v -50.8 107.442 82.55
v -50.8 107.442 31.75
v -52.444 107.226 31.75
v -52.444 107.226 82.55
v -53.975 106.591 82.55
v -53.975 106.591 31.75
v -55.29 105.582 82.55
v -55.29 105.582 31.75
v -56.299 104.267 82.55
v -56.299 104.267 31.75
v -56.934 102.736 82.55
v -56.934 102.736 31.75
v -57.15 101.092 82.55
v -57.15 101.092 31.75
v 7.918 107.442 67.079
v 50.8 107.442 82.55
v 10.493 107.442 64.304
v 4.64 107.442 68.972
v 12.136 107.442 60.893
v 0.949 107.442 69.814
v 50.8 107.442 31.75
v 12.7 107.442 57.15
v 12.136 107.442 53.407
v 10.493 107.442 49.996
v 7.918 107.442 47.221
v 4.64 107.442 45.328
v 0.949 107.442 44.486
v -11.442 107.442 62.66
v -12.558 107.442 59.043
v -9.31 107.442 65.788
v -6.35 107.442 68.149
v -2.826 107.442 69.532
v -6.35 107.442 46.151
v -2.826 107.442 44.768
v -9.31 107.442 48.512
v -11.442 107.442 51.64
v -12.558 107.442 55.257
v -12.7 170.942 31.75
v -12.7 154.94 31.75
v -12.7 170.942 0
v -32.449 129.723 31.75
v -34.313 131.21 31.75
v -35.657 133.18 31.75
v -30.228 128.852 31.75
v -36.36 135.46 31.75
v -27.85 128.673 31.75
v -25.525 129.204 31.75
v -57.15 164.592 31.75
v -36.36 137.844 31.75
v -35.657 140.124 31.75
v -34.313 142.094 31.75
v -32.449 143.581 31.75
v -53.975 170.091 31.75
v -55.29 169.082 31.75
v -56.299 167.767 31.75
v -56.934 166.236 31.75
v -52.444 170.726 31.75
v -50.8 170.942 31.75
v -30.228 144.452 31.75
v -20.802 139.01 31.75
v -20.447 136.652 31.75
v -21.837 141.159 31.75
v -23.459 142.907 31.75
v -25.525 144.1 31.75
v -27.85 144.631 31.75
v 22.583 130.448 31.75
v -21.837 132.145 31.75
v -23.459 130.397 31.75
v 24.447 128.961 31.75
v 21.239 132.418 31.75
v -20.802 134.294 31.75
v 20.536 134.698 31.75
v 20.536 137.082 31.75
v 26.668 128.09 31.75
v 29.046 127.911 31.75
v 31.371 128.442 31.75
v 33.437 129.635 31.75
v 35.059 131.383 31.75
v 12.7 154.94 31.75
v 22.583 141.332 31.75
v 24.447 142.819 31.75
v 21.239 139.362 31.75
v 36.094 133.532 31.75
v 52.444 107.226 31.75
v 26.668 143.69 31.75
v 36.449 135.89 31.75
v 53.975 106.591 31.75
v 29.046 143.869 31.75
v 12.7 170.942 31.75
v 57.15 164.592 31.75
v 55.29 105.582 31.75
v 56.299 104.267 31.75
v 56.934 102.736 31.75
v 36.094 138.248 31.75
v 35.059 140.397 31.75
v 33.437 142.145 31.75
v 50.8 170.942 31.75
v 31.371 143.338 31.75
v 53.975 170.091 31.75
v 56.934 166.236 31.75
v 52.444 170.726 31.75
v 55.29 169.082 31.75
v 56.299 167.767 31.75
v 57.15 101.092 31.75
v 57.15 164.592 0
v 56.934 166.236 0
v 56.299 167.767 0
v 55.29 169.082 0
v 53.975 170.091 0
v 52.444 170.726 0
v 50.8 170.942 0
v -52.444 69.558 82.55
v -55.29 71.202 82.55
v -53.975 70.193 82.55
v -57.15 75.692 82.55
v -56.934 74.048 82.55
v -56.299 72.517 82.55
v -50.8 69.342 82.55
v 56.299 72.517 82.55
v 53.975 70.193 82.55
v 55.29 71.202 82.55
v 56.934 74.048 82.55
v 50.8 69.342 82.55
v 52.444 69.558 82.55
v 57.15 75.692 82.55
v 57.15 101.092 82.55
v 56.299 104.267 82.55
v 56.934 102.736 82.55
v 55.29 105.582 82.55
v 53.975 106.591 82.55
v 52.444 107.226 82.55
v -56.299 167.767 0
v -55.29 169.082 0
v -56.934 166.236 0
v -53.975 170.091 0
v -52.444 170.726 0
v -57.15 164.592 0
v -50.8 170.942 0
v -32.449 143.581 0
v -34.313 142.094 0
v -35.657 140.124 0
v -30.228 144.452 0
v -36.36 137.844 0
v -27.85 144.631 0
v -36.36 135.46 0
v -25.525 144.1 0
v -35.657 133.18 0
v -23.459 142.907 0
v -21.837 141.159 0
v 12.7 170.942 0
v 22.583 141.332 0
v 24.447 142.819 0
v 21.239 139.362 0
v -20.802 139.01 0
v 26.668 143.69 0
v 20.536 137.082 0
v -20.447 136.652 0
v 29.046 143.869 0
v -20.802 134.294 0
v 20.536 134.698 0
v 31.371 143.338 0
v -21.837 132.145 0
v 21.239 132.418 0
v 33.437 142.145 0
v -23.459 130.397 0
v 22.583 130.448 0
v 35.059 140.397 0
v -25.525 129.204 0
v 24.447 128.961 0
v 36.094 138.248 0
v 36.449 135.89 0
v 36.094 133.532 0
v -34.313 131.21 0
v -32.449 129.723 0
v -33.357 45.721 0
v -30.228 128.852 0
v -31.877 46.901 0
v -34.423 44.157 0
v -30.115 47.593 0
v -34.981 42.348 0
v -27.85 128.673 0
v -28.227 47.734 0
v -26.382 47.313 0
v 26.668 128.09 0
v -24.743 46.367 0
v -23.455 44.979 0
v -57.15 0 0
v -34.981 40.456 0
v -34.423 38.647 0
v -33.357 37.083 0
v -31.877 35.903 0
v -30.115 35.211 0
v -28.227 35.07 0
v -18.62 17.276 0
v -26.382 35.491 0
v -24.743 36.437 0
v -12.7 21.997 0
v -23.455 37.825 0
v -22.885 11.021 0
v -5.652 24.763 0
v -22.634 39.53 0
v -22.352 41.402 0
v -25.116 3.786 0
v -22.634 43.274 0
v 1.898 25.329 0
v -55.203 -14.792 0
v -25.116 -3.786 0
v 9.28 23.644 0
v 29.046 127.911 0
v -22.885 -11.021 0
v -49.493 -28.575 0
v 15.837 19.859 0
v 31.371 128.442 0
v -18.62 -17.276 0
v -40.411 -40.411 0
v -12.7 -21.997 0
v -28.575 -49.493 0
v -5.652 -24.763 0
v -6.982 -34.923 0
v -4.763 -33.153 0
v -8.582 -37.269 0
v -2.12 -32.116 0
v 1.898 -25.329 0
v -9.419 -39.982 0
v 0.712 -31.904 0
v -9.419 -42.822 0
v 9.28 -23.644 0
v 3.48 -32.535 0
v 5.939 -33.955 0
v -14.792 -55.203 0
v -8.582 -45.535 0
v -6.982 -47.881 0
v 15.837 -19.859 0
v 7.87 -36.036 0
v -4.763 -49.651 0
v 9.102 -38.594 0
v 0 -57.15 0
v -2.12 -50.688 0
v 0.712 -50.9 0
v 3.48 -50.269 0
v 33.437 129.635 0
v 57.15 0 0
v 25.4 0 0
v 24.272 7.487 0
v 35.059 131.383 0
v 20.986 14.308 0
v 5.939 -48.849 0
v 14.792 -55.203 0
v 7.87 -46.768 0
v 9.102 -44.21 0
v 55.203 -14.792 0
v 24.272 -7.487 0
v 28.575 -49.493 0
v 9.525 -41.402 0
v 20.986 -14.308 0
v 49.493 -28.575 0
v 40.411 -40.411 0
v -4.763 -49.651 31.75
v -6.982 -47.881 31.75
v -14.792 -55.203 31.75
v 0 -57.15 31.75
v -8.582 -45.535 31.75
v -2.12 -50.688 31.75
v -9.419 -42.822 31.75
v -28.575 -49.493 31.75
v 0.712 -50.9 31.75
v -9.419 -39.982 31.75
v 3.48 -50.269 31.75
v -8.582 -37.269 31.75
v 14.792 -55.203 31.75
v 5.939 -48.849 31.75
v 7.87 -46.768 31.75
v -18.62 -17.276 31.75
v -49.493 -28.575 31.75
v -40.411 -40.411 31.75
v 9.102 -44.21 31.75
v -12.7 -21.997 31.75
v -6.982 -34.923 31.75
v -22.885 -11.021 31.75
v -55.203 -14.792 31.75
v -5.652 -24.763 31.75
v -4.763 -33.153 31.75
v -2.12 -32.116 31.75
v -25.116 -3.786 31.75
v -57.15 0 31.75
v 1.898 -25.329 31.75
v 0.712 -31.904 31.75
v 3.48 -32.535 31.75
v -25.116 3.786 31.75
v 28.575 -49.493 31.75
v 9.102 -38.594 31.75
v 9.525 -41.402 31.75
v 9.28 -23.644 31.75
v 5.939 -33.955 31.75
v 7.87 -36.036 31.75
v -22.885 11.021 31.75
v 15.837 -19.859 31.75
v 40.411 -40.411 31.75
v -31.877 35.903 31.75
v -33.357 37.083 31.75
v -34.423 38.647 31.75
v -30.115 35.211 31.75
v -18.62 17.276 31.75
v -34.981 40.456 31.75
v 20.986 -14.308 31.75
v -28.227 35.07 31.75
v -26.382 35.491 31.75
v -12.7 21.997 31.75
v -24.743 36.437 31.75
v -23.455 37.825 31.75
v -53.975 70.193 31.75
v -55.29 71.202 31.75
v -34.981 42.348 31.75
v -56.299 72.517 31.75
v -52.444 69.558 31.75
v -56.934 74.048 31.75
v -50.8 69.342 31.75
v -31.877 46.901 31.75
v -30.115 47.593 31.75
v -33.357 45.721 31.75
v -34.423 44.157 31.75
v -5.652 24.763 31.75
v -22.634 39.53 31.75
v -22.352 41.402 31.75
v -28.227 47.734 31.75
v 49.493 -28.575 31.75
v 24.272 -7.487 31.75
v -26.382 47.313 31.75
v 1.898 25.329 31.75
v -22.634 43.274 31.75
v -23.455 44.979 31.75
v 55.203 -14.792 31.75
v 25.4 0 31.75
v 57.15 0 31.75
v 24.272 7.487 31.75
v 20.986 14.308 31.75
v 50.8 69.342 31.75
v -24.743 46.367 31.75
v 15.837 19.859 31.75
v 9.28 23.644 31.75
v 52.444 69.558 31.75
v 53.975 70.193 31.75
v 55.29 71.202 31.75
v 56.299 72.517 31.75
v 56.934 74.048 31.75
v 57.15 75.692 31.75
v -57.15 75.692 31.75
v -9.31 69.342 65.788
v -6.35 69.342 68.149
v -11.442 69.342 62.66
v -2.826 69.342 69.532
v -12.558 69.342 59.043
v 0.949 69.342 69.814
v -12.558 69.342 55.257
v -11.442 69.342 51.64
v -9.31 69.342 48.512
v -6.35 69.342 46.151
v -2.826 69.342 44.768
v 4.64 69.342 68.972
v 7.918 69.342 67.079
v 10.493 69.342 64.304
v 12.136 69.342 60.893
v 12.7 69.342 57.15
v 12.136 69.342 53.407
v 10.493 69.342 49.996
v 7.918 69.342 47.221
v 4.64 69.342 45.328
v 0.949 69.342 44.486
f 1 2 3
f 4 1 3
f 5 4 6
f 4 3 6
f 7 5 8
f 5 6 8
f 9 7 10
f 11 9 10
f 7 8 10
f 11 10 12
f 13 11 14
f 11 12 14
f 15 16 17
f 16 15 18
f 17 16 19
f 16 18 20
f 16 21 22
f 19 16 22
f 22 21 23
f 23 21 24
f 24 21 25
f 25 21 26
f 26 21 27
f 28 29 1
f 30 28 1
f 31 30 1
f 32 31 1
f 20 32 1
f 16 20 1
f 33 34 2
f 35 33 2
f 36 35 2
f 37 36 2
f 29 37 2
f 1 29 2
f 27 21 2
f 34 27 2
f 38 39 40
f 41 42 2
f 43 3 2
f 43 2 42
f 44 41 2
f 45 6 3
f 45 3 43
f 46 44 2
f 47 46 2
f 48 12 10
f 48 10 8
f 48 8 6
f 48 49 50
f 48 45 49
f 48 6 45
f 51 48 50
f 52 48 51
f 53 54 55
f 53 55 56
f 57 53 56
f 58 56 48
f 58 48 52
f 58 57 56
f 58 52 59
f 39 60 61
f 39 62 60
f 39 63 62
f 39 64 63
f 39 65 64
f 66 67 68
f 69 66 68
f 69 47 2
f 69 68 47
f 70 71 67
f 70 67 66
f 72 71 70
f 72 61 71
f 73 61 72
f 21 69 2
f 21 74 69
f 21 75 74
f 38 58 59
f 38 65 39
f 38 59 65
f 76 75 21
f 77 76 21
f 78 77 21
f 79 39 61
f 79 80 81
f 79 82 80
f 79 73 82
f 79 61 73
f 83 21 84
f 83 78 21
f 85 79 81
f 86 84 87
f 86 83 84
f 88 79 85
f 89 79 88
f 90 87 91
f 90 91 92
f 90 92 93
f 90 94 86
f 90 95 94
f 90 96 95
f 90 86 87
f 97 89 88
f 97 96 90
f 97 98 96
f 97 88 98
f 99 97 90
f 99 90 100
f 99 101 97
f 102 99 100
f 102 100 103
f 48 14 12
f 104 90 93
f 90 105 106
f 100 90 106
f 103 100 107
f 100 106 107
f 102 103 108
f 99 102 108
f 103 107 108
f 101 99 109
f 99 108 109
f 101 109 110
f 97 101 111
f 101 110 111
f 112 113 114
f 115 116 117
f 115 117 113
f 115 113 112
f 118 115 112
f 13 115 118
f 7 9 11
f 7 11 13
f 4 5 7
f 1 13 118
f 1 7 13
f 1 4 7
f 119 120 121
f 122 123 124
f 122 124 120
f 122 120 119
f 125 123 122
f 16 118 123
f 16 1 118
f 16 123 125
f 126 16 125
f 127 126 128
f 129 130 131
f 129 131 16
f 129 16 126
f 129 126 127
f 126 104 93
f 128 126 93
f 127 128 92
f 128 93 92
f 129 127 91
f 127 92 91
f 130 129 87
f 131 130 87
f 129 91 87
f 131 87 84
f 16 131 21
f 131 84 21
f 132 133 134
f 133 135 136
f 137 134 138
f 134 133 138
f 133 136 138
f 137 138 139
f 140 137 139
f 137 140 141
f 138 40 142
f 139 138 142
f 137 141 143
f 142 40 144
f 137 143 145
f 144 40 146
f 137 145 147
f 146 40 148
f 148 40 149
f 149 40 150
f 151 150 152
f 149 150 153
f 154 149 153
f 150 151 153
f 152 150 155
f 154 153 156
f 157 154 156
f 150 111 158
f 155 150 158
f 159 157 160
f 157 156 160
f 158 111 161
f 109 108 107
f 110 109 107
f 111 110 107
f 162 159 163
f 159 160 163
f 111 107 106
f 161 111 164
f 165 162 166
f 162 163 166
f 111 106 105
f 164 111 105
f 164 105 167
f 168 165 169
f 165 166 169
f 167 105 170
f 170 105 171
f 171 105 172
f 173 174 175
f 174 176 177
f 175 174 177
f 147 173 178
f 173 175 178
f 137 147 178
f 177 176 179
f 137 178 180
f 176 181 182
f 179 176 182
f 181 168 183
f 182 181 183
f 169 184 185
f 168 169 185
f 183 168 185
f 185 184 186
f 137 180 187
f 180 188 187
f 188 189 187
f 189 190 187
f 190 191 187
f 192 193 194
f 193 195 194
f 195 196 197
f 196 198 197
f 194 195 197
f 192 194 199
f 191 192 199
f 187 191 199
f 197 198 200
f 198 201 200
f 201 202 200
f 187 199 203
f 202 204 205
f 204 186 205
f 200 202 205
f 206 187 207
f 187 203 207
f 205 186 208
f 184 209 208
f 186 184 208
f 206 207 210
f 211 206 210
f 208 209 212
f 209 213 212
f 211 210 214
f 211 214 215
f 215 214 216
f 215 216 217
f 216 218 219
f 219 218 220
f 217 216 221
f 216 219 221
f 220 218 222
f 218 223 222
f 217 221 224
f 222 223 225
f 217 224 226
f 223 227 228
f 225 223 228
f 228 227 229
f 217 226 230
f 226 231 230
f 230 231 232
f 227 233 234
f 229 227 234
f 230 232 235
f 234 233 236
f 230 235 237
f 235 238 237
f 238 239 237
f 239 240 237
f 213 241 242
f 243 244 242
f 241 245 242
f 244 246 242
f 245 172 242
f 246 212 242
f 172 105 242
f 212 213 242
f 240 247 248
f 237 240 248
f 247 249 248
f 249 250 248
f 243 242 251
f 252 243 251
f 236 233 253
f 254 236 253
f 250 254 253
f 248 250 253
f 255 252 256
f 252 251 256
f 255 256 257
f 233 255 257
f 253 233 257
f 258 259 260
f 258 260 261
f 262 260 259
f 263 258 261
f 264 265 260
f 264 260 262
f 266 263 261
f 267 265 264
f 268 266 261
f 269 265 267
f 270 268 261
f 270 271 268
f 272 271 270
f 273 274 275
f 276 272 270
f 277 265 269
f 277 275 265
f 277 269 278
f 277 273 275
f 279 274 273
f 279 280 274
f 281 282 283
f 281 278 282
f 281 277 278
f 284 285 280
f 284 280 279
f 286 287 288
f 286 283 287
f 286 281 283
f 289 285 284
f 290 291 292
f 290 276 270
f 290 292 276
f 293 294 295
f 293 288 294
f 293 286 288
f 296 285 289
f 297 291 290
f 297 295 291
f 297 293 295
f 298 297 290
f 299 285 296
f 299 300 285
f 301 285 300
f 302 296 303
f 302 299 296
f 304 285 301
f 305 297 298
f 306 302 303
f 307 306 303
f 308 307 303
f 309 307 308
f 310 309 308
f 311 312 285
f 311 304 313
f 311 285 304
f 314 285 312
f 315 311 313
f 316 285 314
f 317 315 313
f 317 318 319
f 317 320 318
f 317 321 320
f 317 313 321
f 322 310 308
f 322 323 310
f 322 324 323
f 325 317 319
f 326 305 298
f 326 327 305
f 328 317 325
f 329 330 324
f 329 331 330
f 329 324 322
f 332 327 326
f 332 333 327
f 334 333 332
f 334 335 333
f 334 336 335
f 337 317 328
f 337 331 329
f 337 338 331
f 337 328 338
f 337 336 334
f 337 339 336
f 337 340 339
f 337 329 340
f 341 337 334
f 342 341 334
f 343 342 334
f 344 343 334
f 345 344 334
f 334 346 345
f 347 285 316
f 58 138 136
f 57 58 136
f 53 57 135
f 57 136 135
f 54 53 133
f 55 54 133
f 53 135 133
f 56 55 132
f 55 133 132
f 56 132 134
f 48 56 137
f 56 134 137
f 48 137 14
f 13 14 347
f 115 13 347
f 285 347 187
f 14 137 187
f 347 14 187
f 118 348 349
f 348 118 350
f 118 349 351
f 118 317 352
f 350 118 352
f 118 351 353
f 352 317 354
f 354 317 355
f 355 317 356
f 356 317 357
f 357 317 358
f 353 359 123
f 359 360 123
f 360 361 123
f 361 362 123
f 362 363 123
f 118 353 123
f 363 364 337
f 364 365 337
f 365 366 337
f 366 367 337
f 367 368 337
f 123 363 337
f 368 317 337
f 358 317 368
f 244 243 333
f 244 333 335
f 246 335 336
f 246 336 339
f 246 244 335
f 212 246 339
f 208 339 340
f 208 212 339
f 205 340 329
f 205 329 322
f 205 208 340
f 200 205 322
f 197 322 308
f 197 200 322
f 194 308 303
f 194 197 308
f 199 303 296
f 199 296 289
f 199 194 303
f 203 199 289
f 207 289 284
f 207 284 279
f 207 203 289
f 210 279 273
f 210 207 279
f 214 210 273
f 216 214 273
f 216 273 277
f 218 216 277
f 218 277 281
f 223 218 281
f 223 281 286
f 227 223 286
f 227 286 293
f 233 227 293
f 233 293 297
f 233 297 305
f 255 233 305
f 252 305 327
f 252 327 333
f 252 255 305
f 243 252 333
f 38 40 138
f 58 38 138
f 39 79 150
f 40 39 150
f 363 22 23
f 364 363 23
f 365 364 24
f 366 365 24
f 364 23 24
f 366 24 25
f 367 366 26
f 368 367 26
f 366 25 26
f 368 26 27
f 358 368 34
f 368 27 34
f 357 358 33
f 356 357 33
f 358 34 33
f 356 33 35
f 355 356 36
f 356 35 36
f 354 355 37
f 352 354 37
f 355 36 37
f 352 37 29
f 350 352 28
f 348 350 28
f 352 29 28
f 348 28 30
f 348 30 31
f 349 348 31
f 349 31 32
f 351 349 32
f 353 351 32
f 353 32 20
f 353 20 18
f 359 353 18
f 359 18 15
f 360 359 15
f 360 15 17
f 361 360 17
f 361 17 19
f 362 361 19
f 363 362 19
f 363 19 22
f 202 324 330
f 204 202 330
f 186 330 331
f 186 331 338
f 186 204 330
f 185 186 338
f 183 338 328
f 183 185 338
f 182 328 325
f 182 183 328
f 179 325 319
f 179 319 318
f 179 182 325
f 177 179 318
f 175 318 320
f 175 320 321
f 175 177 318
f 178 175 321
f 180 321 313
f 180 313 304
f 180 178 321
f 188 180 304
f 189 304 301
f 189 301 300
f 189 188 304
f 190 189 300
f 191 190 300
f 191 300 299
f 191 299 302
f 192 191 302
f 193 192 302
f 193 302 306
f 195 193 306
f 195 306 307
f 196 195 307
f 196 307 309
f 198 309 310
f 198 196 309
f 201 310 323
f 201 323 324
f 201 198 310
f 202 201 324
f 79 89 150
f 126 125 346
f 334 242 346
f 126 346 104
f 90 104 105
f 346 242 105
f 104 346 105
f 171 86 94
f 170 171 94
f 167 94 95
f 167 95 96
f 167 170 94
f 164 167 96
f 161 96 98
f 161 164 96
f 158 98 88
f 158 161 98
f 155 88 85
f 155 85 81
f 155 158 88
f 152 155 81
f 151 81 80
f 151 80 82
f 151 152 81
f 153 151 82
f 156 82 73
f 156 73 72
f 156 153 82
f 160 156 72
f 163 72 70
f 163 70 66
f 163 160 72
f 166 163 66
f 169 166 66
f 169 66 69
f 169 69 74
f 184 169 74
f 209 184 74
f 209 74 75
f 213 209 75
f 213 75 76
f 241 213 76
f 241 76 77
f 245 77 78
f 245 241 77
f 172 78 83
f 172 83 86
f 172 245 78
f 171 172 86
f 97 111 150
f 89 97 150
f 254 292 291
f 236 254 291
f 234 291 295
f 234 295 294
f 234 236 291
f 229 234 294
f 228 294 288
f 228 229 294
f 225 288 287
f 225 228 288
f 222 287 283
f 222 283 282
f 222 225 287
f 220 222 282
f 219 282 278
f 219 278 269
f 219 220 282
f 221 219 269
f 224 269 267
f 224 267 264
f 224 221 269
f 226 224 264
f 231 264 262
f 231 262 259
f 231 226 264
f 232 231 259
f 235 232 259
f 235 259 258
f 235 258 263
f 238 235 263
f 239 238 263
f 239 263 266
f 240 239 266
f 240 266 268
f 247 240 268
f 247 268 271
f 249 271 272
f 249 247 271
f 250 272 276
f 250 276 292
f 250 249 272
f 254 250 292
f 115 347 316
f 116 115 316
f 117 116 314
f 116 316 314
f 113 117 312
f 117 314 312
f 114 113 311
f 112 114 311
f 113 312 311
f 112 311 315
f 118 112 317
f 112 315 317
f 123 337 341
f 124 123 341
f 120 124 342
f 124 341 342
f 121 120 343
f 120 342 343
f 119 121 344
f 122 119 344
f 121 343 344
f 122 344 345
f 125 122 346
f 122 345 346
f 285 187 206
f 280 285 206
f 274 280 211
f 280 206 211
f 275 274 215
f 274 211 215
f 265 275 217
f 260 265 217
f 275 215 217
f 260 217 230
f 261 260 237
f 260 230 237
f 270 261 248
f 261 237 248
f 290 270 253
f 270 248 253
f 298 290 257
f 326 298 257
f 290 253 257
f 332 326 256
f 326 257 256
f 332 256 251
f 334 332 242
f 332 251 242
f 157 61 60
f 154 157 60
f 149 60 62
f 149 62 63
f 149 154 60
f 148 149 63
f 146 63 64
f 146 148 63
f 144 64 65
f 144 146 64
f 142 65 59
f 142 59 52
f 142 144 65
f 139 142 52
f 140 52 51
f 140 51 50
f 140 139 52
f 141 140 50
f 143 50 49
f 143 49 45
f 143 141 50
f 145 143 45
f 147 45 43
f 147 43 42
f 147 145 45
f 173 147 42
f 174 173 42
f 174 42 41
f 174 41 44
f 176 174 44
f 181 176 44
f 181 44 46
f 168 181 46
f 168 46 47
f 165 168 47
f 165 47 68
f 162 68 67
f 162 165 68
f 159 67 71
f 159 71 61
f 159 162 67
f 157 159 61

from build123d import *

# Parameters (mm, degrees)
CROQUIS1_R                = 8.001
SALIENTE_EXTRUIR1_DEPTH   = 31.75
CROQUIS1_R_2              = 6.35
CROQUIS1_R_3              = 9.525
CROQUIS1_R_4              = 25.4
SALIENTE_EXTRUIR1_2_DEPTH = 31.75
SALIENTE_EXTRUIR2_DEPTH   = 82.55
CORTAR_EXTRUIR1_REACH     = 194.798
CROQUIS3_R                = 12.7
SALIENTE_EXTRUIR3_REACH   = 204.274


with BuildPart() as part:
    # Croquis1 → Saliente-Extruir1 (new body)
    with BuildSketch(Plane.XY):
        with BuildLine():
            Line((50.8, 170.942), (12.7, 170.942))
            Line((12.7, 170.942), (12.7, 154.94))
            Line((12.7, 154.94), (-12.7, 154.94))
            Line((-12.7, 154.94), (-12.7, 170.942))
            Line((-12.7, 170.942), (-50.8, 170.942))
            ThreePointArc((-50.8, 170.942), (-55.290128061, 169.082128061), (-57.15, 164.592))
            Line((-57.15, 164.592), (-57.15, 101.092))
            ThreePointArc((-57.15, 101.092), (-55.290128061, 105.582128061), (-50.8, 107.442))
            Line((-50.8, 107.442), (50.8, 107.442))
            ThreePointArc((50.8, 107.442), (55.290128061, 105.582128061), (57.15, 101.092))
            Line((57.15, 101.092), (57.15, 164.592))
            ThreePointArc((57.15, 164.592), (55.290128061, 169.082128061), (50.8, 170.942))
        make_face()
        with Locations((-28.448, 136.652)):
            Circle(CROQUIS1_R, mode=Mode.SUBTRACT)
        with Locations((28.448, 135.89)):
            Circle(CROQUIS1_R, mode=Mode.SUBTRACT)
    extrude(amount=SALIENTE_EXTRUIR1_DEPTH)



with BuildPart() as body_2:
    # Croquis1 → Saliente-Extruir1 2 (new body)
    with BuildSketch(Plane.XY):
        with BuildLine():
            Line((57.15, 0), (57.15, 75.692))
            ThreePointArc((57.15, 75.692), (55.290128061, 71.201871939), (50.8, 69.342))
            Line((50.8, 69.342), (-50.8, 69.342))
            ThreePointArc((-50.8, 69.342), (-55.290128061, 71.201871939), (-57.15, 75.692))
            Line((-57.15, 75.692), (-57.15, 0))
            ThreePointArc((-57.15, 0), (0, -57.15), (57.15, 0))
        make_face()
        with Locations((-28.702, 41.402)):
            Circle(CROQUIS1_R_2, mode=Mode.SUBTRACT)
        with Locations((0, -41.402)):
            Circle(CROQUIS1_R_3, mode=Mode.SUBTRACT)
        Circle(CROQUIS1_R_4, mode=Mode.SUBTRACT)
    extrude(amount=SALIENTE_EXTRUIR1_2_DEPTH)


with BuildPart() as part_1:
    add(part.part)

    add(body_2.part)  # Saliente-Extruir2 merges body 2
    # Croquis1<3> → Saliente-Extruir2 (add)
    with BuildSketch(Plane.XY):
        with BuildLine():
            Line((57.15, 75.692), (57.15, 101.092))
            ThreePointArc((57.15, 101.092), (55.290128061, 105.582128061), (50.8, 107.442))
            Line((50.8, 107.442), (-50.8, 107.442))
            ThreePointArc((-50.8, 107.442), (-55.290128061, 105.582128061), (-57.15, 101.092))
            Line((-57.15, 101.092), (-57.15, 75.692))
            ThreePointArc((-57.15, 75.692), (-55.290128061, 71.201871939), (-50.8, 69.342))
            Line((-50.8, 69.342), (50.8, 69.342))
            ThreePointArc((50.8, 69.342), (55.290128061, 71.201871939), (57.15, 75.692))
        make_face()
    extrude(amount=SALIENTE_EXTRUIR2_DEPTH)

    # Croquis3 → Cortar-Extruir1 (cut, up to next)
    with BuildSketch(Plane(origin=(0, 107.442, 0), x_dir=(1, 0, 0), z_dir=(0, 1, 0)), mode=Mode.PRIVATE) as cortar_extruir1_sk1:
        with Locations((0, -57.15)):
            Circle(CROQUIS3_R)
    cortar_extruir1_tool1 = extrude(cortar_extruir1_sk1.sketch, amount=-CORTAR_EXTRUIR1_REACH, mode=Mode.PRIVATE) & part_1.part
    add(cortar_extruir1_tool1.solids().sort_by_distance((0, 107.442, 57.15))[0], mode=Mode.SUBTRACT)

    # Croquis4 → Saliente-Extruir3 (add, up to next)
    with BuildSketch(Plane.ZY.offset(-12.7), mode=Mode.PRIVATE) as saliente_extruir3_sk1:
        Polygon((31.75, 154.94), (0, 170.942), (0, 154.94), align=None)
    saliente_extruir3_tool1 = extrude(saliente_extruir3_sk1.sketch, amount=SALIENTE_EXTRUIR3_REACH, mode=Mode.PRIVATE) - part_1.part
    add(saliente_extruir3_tool1.solids().sort_by_distance((12.7, 160.274, 10.583333))[0])


solid = part_1.part
